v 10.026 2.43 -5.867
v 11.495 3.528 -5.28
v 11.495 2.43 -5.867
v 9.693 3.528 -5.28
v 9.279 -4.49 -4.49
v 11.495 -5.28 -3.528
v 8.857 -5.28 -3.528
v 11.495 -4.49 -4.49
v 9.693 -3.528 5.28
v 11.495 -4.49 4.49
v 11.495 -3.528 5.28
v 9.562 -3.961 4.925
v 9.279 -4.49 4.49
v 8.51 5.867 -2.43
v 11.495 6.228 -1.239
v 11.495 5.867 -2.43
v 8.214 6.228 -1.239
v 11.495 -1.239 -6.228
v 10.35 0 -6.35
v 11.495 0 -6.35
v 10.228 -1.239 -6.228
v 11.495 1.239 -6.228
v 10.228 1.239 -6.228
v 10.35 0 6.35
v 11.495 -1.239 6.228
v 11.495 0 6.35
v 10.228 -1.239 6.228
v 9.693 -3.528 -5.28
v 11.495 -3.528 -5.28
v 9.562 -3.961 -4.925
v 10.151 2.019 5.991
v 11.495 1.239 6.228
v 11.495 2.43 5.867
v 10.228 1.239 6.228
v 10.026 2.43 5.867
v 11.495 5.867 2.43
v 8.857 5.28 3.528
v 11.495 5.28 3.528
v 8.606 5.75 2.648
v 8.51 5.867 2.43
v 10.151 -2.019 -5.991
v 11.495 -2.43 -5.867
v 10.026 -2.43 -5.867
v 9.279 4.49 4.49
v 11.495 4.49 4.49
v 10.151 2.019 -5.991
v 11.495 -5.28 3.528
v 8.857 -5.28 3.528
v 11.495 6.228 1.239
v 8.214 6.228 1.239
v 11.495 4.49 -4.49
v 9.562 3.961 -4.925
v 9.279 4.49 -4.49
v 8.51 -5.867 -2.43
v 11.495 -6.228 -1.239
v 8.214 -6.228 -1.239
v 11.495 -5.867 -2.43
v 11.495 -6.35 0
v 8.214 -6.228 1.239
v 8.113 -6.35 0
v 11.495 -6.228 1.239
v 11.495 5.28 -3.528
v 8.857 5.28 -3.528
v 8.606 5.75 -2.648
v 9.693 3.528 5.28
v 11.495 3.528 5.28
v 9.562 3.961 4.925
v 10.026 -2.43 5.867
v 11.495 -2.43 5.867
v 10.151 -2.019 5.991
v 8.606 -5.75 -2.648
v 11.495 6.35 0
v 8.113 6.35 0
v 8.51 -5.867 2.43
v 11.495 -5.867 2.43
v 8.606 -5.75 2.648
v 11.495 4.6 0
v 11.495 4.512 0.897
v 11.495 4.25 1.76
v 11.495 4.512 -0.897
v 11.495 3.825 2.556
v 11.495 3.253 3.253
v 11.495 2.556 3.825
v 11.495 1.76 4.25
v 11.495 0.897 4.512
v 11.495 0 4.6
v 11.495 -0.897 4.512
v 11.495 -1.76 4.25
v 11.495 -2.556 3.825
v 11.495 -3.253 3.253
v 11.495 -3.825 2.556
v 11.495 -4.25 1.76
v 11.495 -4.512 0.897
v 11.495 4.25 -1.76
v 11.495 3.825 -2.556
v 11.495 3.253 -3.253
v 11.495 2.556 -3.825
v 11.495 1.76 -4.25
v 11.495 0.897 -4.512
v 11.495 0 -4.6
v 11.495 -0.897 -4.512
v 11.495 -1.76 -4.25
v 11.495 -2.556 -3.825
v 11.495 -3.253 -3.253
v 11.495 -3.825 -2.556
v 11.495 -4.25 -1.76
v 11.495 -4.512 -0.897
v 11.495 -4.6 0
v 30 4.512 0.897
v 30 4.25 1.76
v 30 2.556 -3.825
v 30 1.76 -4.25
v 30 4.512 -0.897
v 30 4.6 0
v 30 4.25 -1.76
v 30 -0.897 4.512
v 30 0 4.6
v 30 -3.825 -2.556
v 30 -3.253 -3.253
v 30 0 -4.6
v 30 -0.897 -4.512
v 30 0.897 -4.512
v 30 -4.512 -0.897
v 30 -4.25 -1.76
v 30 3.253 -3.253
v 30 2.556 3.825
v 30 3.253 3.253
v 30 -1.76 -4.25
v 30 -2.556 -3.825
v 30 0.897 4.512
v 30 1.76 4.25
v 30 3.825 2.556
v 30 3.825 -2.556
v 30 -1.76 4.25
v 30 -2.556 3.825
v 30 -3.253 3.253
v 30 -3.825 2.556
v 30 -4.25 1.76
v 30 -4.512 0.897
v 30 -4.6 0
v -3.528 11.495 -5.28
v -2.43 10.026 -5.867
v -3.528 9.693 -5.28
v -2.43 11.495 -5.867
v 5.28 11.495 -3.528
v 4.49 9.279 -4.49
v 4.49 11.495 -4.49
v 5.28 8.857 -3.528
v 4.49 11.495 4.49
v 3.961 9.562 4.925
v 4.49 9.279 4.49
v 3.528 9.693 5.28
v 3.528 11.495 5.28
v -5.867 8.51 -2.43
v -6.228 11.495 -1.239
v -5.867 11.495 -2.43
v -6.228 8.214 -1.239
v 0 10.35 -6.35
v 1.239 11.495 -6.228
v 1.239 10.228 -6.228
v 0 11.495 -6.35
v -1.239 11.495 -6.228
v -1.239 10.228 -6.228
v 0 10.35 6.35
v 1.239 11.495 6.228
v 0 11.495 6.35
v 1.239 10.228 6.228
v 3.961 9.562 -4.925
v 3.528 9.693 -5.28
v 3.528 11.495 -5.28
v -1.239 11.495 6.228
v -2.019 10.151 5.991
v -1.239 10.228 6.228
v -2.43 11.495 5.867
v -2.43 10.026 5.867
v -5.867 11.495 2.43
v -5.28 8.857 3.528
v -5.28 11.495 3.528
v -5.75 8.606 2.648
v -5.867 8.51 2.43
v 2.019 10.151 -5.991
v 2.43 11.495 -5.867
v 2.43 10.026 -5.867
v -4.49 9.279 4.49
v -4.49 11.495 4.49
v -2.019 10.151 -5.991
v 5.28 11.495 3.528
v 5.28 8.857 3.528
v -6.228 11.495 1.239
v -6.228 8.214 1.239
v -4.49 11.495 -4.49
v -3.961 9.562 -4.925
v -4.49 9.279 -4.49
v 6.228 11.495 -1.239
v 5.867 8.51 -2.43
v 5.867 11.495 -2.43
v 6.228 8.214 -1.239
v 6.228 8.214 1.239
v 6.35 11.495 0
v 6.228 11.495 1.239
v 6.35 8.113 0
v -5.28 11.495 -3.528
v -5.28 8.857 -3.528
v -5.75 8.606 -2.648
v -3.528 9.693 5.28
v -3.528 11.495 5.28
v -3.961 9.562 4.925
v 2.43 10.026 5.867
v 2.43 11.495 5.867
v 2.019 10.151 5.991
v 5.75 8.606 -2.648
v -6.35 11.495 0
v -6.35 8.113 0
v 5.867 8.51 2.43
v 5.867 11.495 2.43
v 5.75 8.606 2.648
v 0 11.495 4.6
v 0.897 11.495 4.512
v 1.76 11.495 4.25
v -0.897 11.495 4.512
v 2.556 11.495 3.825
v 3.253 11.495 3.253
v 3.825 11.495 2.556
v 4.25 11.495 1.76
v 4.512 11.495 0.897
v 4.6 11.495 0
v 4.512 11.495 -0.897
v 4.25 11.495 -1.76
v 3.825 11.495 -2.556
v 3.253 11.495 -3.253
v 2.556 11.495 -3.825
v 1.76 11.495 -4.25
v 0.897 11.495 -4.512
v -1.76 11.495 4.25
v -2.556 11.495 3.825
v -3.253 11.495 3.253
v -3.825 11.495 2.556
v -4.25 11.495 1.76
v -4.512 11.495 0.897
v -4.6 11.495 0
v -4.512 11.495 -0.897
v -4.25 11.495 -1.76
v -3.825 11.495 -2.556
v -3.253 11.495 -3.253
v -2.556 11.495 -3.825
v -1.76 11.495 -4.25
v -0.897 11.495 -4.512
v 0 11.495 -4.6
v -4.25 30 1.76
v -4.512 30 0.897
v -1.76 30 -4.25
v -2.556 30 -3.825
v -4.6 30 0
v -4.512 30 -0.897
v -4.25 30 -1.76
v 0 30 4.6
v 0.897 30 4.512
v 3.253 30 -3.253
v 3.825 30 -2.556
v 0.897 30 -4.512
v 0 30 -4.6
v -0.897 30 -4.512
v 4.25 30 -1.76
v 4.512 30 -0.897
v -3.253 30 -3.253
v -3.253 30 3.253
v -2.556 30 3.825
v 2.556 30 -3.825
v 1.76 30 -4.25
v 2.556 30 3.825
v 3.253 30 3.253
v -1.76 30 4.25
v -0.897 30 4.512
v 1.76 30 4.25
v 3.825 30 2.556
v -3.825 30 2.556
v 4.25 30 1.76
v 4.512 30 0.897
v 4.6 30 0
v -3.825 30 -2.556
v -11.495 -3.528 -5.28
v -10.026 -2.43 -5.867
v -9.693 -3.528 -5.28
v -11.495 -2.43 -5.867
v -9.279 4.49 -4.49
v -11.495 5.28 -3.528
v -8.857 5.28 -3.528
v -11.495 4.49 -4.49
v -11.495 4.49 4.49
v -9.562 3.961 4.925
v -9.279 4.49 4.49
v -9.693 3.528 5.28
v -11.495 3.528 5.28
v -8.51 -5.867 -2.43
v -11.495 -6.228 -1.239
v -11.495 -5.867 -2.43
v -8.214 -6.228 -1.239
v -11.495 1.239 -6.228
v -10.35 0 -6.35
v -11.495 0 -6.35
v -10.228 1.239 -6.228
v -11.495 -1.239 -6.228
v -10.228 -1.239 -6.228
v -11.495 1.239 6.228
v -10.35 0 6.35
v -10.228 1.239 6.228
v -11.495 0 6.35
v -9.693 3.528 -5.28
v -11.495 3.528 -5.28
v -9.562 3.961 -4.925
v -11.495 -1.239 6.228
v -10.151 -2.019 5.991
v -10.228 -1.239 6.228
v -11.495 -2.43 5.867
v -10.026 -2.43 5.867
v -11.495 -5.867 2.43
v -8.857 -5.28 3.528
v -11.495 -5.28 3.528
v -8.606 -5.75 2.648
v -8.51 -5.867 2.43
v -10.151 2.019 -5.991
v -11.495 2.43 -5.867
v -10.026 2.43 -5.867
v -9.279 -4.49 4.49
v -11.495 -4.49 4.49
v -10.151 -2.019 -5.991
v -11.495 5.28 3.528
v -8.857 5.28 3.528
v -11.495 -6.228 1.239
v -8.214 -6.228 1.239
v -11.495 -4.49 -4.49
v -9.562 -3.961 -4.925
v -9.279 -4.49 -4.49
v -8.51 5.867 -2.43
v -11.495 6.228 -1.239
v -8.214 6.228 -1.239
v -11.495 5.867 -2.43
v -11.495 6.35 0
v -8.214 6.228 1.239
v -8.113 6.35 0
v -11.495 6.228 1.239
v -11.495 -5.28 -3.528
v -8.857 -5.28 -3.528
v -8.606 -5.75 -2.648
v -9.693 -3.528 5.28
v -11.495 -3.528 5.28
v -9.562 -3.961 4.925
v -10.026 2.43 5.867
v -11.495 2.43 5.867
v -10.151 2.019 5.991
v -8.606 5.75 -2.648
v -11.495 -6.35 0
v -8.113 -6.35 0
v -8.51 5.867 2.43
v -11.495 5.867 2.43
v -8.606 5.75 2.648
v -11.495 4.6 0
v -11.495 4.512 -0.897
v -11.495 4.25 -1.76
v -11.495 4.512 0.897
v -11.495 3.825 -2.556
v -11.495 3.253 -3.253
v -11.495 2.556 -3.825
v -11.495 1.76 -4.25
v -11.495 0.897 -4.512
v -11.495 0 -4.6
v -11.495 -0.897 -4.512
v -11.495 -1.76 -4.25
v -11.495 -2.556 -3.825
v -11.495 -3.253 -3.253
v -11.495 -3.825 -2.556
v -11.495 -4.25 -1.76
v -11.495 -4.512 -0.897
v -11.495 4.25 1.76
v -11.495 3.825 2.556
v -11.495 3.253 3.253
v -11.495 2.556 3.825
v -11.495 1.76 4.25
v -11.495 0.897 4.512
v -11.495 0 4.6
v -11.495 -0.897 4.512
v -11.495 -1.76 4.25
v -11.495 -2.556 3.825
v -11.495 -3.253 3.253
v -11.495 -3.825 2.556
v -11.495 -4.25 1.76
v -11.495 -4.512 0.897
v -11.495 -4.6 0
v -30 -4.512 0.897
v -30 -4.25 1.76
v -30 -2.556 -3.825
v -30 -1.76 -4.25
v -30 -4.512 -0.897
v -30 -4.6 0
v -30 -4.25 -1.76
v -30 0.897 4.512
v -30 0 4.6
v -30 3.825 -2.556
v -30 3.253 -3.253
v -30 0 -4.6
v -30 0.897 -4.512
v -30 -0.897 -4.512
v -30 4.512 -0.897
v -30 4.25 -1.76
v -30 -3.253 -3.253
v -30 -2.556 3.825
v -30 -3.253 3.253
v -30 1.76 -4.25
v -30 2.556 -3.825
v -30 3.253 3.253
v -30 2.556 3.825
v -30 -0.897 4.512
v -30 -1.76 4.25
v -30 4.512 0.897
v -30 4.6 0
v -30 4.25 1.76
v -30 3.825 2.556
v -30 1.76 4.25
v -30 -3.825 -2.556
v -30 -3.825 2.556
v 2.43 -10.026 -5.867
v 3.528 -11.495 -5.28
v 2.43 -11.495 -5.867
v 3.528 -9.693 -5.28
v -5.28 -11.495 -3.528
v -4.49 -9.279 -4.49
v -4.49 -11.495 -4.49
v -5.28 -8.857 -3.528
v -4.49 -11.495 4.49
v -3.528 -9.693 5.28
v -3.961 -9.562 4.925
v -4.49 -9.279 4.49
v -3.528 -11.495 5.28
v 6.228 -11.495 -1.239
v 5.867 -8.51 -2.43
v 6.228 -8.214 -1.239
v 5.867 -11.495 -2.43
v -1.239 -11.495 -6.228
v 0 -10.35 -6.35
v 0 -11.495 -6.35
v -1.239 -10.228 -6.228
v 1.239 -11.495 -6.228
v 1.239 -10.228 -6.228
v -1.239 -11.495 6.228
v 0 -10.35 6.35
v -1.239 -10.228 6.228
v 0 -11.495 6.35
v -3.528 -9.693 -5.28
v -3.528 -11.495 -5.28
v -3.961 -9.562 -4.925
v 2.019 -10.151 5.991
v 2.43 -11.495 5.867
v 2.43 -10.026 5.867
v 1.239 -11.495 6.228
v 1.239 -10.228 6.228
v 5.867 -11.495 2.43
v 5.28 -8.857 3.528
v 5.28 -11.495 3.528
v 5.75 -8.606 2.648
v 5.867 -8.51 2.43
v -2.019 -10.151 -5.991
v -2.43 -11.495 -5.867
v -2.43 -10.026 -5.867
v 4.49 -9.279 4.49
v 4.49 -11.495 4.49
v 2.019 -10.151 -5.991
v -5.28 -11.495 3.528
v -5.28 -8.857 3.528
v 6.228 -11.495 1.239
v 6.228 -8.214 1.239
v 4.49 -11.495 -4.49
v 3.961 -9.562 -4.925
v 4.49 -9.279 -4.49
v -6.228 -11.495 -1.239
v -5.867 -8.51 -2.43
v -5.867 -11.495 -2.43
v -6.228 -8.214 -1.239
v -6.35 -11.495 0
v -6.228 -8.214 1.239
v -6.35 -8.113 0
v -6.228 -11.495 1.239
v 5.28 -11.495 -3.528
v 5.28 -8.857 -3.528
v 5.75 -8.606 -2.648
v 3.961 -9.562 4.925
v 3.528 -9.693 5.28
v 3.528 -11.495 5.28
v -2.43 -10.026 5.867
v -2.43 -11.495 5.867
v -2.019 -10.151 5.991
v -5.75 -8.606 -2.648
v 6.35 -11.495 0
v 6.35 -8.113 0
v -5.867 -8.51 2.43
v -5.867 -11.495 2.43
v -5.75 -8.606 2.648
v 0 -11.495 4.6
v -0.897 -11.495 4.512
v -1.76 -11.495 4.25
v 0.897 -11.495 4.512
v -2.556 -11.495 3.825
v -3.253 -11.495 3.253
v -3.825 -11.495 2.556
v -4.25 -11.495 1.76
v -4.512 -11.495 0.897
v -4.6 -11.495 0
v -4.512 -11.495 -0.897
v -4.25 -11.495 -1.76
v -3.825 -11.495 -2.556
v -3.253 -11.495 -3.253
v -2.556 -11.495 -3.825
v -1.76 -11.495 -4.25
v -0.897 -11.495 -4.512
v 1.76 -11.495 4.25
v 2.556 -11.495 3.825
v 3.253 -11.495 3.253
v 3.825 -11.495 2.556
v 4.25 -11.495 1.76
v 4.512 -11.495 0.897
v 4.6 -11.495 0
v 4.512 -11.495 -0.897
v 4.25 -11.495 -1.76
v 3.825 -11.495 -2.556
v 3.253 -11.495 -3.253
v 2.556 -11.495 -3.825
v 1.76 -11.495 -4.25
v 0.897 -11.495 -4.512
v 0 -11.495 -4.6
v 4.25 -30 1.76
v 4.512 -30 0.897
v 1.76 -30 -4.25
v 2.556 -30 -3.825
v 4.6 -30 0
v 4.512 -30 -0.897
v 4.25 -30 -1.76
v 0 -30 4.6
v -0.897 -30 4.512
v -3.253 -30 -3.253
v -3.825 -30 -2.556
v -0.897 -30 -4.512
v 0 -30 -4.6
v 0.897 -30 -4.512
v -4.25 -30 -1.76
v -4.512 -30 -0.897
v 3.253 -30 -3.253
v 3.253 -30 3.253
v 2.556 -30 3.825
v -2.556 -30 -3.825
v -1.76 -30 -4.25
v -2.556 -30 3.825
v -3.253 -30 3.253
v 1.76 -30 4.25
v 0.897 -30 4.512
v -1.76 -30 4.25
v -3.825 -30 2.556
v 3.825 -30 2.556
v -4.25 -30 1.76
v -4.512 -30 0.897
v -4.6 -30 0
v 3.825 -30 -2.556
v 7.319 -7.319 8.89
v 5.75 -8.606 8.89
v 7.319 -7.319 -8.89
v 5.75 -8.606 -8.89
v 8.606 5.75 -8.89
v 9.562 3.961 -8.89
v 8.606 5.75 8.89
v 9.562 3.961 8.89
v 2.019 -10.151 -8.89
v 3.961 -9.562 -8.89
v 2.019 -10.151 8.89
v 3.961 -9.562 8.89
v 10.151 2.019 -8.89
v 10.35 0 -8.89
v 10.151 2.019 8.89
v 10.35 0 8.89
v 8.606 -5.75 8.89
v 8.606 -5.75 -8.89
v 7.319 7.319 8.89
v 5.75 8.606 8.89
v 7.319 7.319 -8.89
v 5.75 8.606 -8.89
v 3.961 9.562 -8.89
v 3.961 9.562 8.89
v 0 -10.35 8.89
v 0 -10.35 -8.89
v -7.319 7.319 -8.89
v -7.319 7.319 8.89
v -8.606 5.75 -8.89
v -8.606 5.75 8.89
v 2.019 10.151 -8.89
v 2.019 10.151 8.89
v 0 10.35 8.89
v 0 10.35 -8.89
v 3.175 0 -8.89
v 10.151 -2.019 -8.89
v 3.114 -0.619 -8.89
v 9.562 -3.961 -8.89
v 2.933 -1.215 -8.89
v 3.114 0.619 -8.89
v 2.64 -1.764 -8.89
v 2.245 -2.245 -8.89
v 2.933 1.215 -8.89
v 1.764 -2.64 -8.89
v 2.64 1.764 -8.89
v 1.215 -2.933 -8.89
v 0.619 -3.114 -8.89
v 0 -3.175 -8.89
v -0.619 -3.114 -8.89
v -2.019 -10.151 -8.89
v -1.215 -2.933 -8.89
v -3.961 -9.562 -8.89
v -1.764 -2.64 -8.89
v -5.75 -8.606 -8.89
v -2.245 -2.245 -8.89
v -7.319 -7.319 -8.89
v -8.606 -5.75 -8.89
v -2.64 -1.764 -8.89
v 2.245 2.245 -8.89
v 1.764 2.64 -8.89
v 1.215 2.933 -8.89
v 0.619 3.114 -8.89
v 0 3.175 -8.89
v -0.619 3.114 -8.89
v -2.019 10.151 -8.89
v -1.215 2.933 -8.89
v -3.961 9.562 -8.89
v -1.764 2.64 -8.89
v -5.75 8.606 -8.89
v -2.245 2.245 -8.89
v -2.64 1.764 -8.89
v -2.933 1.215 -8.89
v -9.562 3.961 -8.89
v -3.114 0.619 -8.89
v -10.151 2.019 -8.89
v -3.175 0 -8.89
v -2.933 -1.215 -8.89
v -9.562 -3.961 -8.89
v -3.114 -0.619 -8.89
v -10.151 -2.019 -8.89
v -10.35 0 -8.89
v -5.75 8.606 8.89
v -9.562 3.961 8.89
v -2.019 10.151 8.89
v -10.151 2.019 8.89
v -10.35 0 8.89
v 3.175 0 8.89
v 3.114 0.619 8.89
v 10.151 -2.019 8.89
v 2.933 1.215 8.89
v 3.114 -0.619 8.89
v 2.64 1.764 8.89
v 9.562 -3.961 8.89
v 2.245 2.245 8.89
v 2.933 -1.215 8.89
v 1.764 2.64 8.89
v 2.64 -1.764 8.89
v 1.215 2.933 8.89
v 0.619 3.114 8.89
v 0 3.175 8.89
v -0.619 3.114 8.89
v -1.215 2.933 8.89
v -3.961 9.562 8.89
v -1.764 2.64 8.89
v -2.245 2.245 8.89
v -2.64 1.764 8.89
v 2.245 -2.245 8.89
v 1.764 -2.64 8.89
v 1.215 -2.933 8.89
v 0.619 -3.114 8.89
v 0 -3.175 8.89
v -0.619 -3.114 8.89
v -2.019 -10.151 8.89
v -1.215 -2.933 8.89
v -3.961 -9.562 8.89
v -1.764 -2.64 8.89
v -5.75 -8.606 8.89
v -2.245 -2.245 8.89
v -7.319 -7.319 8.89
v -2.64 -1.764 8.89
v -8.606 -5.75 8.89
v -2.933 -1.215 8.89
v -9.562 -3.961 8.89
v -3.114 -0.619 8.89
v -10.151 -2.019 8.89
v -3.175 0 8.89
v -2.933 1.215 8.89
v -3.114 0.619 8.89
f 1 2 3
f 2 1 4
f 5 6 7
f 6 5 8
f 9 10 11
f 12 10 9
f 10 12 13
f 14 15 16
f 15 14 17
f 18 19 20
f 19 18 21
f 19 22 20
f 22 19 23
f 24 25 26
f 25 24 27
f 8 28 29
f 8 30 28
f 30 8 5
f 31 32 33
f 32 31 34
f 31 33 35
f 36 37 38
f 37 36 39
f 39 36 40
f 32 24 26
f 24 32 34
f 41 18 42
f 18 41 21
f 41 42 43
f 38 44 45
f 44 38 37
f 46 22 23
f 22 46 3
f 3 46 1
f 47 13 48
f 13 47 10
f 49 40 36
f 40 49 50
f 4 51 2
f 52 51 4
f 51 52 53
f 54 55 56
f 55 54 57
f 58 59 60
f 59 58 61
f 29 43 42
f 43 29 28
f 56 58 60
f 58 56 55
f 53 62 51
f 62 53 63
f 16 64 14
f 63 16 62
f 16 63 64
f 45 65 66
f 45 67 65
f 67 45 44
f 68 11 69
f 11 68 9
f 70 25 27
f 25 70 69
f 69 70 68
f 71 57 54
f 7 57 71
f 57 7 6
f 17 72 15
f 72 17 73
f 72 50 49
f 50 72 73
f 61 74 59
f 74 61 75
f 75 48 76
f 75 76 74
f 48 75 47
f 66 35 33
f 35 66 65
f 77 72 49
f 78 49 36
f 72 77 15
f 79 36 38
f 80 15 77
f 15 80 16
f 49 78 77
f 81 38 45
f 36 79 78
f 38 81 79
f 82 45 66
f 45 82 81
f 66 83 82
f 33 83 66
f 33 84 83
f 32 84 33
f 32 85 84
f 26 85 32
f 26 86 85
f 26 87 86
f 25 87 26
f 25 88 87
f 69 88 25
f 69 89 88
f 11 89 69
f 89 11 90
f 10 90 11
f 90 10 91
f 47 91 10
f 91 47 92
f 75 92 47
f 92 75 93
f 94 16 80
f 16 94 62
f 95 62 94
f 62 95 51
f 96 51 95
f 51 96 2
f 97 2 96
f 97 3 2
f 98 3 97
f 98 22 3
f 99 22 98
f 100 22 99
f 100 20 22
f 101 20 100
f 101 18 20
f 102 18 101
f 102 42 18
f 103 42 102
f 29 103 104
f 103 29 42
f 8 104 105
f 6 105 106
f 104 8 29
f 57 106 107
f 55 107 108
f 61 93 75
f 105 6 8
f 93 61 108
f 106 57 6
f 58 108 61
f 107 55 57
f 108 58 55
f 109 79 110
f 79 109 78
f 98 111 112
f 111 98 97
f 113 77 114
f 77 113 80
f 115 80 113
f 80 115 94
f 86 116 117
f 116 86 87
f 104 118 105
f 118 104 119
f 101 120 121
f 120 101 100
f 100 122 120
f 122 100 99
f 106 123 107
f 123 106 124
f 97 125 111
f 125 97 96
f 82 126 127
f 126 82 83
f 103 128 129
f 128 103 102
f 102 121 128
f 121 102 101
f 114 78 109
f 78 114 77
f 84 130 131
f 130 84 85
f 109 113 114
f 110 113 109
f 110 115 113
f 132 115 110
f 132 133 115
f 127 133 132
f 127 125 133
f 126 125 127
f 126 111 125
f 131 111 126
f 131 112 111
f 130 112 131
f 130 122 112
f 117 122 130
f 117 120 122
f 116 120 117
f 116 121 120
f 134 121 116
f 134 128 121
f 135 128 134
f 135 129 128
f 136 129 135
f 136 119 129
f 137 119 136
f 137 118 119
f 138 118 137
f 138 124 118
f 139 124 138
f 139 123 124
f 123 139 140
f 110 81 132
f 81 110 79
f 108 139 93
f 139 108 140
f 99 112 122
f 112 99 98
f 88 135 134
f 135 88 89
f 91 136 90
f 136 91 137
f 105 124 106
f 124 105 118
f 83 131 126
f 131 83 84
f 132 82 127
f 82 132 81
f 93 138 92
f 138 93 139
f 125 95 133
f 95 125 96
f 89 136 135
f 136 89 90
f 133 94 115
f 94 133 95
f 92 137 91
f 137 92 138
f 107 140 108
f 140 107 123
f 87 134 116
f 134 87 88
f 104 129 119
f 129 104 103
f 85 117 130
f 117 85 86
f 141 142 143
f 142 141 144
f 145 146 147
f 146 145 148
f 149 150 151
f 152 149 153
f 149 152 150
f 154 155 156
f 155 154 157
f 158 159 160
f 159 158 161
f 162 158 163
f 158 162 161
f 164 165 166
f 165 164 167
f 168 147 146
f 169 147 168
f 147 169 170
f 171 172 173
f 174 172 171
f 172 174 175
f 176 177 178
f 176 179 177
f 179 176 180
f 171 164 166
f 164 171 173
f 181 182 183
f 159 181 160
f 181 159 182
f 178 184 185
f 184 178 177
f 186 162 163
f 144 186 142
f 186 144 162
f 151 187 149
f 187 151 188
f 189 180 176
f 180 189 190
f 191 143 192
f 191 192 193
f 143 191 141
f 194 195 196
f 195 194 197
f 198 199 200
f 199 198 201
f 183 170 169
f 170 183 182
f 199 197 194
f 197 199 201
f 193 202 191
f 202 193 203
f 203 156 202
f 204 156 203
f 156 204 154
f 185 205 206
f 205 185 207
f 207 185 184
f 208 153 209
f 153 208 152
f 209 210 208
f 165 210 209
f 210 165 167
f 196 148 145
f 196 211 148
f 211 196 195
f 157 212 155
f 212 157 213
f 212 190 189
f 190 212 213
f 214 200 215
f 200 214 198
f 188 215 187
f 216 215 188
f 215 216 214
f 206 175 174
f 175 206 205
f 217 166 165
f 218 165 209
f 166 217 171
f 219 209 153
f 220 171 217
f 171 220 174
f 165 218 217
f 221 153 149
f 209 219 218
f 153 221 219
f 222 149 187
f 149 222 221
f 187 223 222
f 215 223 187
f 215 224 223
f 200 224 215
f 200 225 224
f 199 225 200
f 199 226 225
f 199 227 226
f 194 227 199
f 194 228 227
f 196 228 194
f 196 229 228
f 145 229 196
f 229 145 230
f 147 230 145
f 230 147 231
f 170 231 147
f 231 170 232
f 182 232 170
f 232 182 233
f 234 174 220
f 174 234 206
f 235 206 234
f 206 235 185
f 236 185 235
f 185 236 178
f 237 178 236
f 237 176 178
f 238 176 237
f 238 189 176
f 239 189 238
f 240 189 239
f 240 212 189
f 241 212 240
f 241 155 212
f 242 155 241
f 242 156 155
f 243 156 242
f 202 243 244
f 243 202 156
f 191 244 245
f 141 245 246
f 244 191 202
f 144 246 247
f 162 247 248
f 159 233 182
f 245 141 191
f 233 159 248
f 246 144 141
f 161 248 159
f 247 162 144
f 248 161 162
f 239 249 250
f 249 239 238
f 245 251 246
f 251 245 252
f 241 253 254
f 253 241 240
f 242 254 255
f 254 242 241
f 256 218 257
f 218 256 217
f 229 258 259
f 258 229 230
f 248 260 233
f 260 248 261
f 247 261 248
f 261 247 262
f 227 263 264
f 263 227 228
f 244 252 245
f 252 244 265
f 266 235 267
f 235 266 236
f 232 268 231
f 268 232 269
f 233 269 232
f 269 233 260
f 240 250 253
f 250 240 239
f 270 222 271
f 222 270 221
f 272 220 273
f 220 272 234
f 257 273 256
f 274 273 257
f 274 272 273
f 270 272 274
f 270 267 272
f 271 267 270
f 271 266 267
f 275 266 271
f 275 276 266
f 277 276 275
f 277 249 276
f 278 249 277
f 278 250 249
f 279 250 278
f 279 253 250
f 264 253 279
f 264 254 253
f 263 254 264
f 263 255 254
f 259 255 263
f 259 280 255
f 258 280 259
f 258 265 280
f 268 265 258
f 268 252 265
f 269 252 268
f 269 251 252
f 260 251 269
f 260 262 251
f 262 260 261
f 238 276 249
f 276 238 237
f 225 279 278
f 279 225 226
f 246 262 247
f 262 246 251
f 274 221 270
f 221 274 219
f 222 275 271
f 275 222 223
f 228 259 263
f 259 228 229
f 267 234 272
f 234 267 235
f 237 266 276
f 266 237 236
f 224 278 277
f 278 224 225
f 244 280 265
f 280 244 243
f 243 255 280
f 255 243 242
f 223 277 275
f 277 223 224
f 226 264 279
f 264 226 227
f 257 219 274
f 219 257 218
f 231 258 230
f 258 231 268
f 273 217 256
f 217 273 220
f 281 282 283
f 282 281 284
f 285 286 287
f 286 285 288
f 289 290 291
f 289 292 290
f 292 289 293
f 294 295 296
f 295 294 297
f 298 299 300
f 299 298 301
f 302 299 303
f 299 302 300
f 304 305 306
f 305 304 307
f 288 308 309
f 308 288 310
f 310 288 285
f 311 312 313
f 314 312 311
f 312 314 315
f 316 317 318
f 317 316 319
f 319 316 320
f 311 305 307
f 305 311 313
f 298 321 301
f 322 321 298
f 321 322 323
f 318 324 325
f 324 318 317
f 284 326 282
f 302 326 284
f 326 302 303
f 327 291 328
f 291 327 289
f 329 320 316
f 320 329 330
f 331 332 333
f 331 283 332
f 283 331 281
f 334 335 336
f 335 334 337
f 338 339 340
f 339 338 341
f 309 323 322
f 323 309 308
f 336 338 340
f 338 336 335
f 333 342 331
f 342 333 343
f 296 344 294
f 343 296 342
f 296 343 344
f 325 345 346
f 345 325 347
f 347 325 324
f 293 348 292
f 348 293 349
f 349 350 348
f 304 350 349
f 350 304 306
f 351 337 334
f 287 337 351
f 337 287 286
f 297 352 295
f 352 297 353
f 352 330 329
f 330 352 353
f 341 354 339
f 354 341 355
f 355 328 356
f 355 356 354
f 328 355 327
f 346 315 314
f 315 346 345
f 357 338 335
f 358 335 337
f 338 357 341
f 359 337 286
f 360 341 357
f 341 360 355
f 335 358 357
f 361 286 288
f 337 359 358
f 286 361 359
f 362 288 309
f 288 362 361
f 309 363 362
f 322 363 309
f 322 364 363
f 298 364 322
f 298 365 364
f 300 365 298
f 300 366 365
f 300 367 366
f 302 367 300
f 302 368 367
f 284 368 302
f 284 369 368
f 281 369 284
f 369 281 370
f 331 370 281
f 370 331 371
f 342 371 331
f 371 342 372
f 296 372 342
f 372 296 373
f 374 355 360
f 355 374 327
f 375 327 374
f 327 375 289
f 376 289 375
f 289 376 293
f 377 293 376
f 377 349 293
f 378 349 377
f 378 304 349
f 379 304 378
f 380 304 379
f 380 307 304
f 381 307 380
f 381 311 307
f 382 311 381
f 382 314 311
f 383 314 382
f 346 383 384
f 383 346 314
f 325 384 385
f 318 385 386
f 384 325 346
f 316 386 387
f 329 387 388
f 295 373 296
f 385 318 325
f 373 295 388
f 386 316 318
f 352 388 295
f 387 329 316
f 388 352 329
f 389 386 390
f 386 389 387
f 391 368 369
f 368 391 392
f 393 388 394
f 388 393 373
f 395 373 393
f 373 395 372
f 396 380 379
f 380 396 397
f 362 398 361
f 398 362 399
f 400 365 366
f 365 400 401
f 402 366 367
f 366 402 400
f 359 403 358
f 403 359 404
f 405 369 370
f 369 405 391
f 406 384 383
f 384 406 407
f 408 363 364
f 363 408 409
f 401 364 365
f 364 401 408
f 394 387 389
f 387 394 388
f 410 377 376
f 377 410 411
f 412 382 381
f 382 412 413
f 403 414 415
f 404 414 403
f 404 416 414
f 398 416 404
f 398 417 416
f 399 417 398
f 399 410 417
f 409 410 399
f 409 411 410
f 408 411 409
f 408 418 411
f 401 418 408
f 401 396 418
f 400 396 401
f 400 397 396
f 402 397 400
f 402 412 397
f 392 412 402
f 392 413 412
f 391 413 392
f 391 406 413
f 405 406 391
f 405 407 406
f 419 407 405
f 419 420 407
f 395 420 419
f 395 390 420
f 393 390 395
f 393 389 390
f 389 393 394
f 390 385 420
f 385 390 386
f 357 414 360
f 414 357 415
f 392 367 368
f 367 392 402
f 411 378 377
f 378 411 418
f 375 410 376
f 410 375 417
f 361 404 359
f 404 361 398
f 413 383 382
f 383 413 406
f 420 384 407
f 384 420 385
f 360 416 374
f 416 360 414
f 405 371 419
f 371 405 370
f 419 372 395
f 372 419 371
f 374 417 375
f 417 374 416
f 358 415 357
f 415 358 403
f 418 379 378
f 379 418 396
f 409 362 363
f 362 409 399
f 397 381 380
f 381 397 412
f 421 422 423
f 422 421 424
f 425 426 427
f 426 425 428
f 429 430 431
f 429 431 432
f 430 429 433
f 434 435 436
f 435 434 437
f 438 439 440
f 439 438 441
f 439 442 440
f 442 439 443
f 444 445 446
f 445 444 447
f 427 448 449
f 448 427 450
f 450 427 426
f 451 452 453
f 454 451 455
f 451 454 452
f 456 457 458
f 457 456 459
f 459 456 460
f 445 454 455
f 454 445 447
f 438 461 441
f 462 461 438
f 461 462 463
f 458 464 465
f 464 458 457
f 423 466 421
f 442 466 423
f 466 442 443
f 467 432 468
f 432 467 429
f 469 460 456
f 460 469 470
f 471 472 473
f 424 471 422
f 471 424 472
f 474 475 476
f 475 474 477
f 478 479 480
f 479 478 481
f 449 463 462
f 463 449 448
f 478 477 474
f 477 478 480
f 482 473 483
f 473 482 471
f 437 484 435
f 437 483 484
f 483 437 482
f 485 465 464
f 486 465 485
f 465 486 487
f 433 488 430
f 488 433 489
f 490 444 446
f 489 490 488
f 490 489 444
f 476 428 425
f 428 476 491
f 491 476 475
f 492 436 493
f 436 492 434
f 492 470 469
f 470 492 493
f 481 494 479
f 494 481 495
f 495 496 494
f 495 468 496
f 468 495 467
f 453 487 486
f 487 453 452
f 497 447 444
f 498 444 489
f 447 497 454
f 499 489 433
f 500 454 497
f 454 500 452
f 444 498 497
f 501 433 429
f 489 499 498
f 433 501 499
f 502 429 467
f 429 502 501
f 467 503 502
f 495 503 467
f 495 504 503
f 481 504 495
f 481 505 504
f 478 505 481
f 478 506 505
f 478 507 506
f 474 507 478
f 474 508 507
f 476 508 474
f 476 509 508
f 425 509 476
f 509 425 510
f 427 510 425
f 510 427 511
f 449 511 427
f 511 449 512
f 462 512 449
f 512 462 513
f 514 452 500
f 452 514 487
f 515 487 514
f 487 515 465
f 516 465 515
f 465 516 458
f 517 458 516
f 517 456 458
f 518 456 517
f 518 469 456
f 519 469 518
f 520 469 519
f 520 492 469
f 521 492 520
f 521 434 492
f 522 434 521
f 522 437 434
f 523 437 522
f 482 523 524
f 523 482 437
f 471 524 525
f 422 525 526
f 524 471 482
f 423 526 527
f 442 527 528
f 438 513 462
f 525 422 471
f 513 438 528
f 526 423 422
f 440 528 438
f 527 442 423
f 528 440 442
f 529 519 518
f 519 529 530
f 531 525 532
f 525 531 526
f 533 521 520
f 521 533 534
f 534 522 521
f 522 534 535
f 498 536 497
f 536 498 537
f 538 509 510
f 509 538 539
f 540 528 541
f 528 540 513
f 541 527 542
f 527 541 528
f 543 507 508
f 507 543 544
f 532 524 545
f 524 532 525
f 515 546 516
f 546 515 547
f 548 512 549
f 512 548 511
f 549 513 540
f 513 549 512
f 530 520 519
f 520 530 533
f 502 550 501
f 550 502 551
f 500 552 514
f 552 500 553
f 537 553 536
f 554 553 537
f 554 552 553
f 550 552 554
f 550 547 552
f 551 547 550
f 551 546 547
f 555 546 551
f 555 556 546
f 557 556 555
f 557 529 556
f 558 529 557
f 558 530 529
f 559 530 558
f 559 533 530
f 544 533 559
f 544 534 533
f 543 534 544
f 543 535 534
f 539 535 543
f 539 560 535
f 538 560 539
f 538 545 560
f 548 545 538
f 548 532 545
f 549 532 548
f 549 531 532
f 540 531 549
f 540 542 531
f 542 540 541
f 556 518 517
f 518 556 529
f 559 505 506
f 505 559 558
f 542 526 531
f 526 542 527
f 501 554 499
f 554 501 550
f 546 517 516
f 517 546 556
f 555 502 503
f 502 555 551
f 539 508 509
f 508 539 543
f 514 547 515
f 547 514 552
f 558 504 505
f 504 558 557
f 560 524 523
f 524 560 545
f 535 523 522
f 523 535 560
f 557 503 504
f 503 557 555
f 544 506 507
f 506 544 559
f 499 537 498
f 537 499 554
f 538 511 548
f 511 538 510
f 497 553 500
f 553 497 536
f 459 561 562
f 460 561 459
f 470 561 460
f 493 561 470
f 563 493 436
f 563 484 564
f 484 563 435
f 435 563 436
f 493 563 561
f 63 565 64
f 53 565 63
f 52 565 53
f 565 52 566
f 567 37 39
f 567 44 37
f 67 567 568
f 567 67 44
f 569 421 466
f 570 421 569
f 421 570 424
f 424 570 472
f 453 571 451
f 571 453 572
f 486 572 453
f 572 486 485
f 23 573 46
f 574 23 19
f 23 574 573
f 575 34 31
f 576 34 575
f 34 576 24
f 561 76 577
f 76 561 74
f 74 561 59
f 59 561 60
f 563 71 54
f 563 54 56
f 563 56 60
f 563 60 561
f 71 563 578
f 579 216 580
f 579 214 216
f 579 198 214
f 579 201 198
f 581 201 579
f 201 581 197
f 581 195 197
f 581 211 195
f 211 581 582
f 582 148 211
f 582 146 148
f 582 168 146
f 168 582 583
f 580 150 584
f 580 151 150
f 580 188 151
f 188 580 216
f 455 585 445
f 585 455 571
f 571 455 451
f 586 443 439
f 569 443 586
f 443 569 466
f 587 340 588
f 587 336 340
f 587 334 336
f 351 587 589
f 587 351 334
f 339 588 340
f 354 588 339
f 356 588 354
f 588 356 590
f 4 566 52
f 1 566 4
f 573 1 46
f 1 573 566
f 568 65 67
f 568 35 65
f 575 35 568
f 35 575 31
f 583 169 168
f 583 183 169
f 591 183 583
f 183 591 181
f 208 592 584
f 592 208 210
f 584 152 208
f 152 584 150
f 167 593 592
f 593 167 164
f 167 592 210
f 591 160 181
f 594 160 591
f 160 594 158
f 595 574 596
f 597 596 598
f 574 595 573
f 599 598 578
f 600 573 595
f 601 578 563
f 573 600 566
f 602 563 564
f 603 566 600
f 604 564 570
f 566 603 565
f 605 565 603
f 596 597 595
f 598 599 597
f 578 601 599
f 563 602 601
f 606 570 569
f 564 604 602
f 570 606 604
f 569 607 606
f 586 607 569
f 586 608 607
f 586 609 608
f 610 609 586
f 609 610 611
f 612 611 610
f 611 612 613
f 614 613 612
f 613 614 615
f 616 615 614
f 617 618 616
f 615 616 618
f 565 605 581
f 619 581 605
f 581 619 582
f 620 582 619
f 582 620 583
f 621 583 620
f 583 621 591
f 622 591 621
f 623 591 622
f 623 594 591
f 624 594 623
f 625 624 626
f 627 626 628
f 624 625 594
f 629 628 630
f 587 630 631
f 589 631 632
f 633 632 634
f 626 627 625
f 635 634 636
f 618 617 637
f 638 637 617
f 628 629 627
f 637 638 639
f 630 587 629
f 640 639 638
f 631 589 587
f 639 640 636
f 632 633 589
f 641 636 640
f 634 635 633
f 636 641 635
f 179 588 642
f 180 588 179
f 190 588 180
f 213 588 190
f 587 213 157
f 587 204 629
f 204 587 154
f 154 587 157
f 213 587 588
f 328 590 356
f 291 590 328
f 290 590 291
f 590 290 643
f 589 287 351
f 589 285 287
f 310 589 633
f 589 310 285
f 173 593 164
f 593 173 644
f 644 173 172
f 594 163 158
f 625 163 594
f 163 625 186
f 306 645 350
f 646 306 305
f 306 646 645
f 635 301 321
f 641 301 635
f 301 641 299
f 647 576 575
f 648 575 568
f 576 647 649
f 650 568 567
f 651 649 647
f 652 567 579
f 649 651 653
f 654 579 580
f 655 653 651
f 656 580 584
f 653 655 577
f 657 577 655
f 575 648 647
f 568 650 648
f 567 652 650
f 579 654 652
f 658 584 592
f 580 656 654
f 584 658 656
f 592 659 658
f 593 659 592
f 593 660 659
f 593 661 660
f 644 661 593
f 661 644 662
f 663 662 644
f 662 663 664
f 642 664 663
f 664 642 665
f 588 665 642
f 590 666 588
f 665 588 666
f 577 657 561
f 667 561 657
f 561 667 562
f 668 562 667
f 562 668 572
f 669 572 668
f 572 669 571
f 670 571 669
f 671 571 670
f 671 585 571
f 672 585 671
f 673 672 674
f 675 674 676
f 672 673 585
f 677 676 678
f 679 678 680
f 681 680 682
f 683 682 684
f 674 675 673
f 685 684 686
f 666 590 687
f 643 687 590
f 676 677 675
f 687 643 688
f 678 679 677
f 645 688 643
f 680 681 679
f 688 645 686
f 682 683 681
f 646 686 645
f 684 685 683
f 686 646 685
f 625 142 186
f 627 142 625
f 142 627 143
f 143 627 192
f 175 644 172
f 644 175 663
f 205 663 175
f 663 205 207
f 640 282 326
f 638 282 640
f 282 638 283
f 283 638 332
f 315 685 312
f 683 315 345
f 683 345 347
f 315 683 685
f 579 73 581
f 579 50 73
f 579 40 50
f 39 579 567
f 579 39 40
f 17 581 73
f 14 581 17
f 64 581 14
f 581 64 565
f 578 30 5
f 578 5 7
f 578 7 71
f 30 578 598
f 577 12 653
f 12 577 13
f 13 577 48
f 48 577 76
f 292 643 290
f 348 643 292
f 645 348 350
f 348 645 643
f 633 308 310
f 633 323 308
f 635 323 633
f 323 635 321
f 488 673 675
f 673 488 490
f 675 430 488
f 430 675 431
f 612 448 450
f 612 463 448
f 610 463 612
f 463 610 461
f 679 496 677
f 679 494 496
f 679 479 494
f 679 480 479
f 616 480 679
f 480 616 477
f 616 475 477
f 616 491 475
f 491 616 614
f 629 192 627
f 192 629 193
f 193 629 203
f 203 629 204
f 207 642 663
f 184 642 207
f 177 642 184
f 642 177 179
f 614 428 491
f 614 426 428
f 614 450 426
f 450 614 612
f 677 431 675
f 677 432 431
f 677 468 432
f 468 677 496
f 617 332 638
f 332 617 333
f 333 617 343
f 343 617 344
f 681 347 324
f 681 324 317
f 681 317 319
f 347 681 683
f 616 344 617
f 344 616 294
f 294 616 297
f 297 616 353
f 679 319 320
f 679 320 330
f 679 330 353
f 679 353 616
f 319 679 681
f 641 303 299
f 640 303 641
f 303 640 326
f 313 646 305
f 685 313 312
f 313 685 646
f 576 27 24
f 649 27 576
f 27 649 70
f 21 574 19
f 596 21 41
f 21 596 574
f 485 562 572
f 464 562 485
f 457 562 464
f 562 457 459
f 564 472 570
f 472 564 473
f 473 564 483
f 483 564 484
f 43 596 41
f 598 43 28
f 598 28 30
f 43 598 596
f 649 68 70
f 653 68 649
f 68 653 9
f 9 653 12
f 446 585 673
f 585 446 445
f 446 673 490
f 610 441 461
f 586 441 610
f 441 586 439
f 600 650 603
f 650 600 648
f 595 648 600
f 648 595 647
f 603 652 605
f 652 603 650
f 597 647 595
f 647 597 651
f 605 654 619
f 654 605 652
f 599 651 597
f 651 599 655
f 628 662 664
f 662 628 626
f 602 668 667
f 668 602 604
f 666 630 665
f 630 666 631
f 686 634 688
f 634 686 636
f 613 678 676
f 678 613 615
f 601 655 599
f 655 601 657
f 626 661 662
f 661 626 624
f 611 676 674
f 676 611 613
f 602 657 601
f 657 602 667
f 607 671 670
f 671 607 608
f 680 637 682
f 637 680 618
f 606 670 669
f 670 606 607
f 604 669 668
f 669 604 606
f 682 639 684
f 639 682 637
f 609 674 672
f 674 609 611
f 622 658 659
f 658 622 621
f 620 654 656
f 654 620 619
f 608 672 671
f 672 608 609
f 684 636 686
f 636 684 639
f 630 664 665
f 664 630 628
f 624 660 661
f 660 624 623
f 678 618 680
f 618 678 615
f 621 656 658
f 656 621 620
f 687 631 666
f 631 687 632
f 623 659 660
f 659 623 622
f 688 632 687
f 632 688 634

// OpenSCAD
$fn = 32;

// ----------------------------------------------------------------------
// Cardan cross: 60 mm span, 12.7 mm trunnions
// ----------------------------------------------------------------------

// --- parameters (mm) ---
journal_d = 12.7;         // trunnion diameter
arm_len = 30;             // trunnion length from the centre
step_r = 4.32;            // step position from the centre
step_d = 9.2;             // journal diameter after the step
hub_d = 20.7;             // hub diameter
hub_h = 17.78;            // hub height
bore_d = 6.35;            // hub bore

difference() {
  union() {
    /* hub along the joint axis */
    cylinder(h = hub_h, d = hub_d, center = true);
    for (a = [0 : 90 : 270]) rotate([0, 0, a]) {
      /* trunnion, sunk into the hub */
      translate([hub_d / 4, 0, 0]) rotate([0, 90, 0]) cylinder(h = step_r + 2, d = journal_d);
      /* stepped journal out to the tip */
      translate([step_r - 0.5, 0, 0]) rotate([0, 90, 0]) cylinder(h = arm_len + 0.5 - step_r, d = step_d);
    }
  }
  /* lubrication bore through the hub, 2.5 mm clear on both sides */
  translate([0, 0, -hub_h / 2 - 2.5]) cylinder(h = hub_h + 5, d = bore_d);
}
